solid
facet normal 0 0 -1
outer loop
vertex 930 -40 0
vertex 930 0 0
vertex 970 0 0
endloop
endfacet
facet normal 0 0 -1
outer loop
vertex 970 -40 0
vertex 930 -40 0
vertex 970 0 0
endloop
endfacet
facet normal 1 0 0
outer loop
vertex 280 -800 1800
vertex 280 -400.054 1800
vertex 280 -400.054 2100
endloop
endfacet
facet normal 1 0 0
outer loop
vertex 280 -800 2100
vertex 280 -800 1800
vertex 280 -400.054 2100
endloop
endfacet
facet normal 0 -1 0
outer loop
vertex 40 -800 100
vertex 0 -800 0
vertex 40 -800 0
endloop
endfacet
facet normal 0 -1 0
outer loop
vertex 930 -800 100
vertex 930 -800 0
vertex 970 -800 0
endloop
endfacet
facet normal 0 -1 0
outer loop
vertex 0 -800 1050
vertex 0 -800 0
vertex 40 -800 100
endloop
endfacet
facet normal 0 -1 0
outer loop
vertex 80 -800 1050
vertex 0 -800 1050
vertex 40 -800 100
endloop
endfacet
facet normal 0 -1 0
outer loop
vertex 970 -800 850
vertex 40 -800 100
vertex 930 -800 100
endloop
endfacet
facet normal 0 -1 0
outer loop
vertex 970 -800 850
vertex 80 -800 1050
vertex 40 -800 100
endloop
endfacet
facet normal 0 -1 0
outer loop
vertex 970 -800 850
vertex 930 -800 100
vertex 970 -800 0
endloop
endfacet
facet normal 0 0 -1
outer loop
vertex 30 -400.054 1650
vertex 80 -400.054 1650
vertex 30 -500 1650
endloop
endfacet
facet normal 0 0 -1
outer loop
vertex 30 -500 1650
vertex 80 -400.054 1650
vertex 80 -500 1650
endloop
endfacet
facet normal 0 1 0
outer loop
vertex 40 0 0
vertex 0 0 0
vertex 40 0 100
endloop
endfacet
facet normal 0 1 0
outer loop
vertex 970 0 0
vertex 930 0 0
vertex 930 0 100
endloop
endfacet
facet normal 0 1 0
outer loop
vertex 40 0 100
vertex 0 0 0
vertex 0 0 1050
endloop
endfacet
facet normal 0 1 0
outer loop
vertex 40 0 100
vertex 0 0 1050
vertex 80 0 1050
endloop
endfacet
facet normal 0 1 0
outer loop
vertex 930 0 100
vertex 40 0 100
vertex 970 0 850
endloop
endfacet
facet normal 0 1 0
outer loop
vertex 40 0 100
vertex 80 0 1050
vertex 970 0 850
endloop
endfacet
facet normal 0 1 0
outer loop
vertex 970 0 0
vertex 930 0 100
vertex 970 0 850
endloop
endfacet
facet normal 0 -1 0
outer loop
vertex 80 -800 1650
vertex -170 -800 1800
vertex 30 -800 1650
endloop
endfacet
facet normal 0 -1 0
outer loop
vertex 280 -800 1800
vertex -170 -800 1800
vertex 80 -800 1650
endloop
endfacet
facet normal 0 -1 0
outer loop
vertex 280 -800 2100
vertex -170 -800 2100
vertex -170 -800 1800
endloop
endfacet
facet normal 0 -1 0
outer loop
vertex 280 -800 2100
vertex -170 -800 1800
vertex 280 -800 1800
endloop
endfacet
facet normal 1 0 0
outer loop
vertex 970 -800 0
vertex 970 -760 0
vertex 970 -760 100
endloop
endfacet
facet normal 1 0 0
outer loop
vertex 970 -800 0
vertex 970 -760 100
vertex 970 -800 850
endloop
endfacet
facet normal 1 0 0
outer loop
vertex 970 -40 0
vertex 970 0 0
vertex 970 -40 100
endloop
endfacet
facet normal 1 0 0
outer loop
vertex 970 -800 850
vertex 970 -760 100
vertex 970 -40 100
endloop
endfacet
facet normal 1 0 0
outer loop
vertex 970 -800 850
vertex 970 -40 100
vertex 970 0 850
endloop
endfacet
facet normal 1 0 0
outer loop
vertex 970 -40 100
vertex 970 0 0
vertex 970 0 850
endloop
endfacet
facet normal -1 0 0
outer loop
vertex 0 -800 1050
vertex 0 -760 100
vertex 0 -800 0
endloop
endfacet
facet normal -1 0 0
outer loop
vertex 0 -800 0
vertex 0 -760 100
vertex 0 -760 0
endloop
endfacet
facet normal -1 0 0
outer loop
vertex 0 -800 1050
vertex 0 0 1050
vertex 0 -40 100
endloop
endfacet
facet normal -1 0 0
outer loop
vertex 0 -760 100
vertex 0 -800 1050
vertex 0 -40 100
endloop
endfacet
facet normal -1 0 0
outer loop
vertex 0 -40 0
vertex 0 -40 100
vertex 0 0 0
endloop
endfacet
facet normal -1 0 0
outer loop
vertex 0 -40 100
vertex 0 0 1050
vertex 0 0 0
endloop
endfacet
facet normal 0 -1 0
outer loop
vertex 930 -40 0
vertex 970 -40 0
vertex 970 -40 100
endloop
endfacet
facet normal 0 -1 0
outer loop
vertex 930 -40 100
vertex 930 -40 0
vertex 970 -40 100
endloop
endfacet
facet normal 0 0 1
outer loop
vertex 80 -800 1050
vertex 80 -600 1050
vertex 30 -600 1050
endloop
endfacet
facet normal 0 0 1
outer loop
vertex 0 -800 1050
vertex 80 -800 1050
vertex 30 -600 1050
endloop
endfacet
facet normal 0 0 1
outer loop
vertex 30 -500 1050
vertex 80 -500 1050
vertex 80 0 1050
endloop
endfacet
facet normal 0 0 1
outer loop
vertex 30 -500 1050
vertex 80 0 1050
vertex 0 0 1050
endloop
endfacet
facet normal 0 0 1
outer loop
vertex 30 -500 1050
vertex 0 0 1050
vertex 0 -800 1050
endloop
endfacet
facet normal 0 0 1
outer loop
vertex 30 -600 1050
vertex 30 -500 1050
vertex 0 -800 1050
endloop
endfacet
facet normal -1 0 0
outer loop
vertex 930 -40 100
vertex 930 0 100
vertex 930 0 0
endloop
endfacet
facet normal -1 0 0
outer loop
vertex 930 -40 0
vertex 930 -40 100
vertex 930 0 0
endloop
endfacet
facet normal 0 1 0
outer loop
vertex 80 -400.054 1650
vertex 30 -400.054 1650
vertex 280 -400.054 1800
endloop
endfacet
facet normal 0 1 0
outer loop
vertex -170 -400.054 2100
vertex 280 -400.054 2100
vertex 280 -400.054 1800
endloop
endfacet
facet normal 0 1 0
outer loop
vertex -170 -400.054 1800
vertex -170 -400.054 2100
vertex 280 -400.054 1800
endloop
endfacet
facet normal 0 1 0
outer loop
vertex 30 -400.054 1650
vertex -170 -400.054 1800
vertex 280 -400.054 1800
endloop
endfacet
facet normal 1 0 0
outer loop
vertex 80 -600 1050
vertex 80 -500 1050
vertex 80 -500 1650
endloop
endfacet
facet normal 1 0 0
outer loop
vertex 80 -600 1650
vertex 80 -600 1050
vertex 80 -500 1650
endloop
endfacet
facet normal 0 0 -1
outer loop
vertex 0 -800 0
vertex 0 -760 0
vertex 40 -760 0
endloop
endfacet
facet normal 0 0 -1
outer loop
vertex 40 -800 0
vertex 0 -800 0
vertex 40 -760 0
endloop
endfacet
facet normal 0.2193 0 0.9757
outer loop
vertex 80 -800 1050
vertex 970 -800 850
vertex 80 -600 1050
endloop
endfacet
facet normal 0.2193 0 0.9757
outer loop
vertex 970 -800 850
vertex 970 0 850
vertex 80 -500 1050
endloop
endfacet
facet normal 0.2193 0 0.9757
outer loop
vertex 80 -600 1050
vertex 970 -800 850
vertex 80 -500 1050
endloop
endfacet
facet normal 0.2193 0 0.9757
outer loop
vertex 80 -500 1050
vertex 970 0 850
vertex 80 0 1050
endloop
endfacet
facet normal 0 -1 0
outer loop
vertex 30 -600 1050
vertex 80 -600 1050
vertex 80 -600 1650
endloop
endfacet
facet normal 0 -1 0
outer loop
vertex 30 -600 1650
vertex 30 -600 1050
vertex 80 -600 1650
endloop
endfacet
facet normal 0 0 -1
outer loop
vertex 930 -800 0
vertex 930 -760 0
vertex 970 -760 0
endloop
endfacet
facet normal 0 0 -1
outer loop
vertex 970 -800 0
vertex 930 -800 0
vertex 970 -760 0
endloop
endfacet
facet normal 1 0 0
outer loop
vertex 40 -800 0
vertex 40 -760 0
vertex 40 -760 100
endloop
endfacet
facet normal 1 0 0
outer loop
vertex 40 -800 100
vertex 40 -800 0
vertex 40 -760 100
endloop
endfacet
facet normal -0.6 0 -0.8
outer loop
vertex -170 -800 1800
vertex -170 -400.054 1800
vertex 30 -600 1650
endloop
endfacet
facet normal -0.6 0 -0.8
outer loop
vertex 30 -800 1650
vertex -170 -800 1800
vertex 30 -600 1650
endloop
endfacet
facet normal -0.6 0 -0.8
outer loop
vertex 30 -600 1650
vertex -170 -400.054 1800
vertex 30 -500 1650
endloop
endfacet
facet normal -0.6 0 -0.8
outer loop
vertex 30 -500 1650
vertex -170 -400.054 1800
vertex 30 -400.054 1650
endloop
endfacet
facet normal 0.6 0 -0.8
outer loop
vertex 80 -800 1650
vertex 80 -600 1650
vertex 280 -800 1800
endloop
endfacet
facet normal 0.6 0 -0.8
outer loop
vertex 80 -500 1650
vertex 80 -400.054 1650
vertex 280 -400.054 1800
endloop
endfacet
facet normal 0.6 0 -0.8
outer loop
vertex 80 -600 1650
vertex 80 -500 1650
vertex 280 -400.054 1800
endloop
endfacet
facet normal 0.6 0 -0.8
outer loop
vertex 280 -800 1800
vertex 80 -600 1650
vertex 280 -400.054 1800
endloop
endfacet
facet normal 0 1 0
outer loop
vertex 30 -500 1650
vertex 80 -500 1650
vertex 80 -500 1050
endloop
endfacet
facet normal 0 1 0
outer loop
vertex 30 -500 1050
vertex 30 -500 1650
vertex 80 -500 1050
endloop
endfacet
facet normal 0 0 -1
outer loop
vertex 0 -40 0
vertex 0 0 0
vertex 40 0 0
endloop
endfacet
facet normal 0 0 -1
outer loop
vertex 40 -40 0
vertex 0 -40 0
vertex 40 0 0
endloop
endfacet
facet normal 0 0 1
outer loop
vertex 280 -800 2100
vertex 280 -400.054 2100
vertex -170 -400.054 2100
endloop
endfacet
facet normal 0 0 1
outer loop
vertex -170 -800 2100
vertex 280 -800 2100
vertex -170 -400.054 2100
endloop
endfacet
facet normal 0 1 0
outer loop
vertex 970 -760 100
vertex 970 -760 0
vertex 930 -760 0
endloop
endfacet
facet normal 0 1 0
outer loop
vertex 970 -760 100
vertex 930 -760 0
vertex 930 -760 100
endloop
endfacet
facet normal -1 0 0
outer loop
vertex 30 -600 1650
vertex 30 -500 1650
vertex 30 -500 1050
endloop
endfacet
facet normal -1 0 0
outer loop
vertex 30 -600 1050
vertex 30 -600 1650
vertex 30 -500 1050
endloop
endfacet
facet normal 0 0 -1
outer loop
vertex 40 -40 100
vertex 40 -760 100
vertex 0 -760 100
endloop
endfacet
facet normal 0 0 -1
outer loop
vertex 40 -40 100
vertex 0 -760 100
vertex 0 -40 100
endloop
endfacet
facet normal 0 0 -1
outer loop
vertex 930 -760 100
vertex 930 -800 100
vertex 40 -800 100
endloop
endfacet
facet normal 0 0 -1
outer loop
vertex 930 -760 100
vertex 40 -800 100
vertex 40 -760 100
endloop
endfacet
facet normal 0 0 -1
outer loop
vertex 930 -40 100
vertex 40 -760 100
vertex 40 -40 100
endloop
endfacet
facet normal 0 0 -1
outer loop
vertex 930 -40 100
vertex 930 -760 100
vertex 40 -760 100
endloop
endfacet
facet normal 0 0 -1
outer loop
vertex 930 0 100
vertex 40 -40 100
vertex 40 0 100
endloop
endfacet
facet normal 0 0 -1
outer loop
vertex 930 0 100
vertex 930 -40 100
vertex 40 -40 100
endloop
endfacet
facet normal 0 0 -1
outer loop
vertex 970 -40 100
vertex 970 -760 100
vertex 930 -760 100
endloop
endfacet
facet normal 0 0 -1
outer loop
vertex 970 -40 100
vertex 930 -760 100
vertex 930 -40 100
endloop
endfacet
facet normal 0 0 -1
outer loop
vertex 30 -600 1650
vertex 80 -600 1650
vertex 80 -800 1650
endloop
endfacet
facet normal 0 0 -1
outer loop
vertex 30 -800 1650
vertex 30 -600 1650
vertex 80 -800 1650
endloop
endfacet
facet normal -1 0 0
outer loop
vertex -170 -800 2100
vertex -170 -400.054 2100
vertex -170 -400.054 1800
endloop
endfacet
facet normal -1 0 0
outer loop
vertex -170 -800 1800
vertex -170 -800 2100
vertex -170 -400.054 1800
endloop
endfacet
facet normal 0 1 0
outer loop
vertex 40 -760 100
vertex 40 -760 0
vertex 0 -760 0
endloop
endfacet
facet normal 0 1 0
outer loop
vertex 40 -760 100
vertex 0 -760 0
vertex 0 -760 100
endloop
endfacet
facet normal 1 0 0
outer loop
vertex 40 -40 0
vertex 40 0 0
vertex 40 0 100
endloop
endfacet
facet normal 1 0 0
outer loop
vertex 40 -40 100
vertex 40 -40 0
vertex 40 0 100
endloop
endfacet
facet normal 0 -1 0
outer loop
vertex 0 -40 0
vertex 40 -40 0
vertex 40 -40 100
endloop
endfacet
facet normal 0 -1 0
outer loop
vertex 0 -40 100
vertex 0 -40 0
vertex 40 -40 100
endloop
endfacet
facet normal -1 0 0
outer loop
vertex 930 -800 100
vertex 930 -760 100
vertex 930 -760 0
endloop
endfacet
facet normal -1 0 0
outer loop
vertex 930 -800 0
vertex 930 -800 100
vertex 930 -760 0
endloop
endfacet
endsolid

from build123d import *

# Parameters (mm, degrees)
F1_DEPTH = 800
F2_W     = 720
F2_H     = 100
F3_DEPTH = 1140.001


with BuildPart() as f1:
    # F0 (on Front) → F1 (new body)
    with BuildSketch(Plane.XZ):
        Polygon((0, 1050), (0, 0), (40, 0), (40, 100), (930, 100), (930, 0), (970, 0), (970, 850), (80, 1050), (80, 1650), (280, 1800), (280, 2100), (-170, 2100), (-170, 1800), (30, 1650), (30, 1050), align=None)
    extrude(amount=F1_DEPTH)

    # F2 (on face) → F3 (cut, through all)
    with BuildSketch(Plane.YZ.offset(970)):
        with Locations((-400, 50)):
            Rectangle(F2_W, F2_H)
        Polygon((-1182.620752, 1232.519794), (-800, 1050), (-600, 1050), (-600, 1650), (-800, 1650), (-800, 2165.248656), (-400.054373, 2171.843762), (-400.054373, 1650), (-500, 1650), (-500, 1050), (130.563885, 1050), (1207.751429, 1992.828178), (48.128108, 2661.814022), (-1305.009472, 2532.382298), align=None)
    extrude(amount=-F3_DEPTH, mode=Mode.SUBTRACT)


solid = f1.part
